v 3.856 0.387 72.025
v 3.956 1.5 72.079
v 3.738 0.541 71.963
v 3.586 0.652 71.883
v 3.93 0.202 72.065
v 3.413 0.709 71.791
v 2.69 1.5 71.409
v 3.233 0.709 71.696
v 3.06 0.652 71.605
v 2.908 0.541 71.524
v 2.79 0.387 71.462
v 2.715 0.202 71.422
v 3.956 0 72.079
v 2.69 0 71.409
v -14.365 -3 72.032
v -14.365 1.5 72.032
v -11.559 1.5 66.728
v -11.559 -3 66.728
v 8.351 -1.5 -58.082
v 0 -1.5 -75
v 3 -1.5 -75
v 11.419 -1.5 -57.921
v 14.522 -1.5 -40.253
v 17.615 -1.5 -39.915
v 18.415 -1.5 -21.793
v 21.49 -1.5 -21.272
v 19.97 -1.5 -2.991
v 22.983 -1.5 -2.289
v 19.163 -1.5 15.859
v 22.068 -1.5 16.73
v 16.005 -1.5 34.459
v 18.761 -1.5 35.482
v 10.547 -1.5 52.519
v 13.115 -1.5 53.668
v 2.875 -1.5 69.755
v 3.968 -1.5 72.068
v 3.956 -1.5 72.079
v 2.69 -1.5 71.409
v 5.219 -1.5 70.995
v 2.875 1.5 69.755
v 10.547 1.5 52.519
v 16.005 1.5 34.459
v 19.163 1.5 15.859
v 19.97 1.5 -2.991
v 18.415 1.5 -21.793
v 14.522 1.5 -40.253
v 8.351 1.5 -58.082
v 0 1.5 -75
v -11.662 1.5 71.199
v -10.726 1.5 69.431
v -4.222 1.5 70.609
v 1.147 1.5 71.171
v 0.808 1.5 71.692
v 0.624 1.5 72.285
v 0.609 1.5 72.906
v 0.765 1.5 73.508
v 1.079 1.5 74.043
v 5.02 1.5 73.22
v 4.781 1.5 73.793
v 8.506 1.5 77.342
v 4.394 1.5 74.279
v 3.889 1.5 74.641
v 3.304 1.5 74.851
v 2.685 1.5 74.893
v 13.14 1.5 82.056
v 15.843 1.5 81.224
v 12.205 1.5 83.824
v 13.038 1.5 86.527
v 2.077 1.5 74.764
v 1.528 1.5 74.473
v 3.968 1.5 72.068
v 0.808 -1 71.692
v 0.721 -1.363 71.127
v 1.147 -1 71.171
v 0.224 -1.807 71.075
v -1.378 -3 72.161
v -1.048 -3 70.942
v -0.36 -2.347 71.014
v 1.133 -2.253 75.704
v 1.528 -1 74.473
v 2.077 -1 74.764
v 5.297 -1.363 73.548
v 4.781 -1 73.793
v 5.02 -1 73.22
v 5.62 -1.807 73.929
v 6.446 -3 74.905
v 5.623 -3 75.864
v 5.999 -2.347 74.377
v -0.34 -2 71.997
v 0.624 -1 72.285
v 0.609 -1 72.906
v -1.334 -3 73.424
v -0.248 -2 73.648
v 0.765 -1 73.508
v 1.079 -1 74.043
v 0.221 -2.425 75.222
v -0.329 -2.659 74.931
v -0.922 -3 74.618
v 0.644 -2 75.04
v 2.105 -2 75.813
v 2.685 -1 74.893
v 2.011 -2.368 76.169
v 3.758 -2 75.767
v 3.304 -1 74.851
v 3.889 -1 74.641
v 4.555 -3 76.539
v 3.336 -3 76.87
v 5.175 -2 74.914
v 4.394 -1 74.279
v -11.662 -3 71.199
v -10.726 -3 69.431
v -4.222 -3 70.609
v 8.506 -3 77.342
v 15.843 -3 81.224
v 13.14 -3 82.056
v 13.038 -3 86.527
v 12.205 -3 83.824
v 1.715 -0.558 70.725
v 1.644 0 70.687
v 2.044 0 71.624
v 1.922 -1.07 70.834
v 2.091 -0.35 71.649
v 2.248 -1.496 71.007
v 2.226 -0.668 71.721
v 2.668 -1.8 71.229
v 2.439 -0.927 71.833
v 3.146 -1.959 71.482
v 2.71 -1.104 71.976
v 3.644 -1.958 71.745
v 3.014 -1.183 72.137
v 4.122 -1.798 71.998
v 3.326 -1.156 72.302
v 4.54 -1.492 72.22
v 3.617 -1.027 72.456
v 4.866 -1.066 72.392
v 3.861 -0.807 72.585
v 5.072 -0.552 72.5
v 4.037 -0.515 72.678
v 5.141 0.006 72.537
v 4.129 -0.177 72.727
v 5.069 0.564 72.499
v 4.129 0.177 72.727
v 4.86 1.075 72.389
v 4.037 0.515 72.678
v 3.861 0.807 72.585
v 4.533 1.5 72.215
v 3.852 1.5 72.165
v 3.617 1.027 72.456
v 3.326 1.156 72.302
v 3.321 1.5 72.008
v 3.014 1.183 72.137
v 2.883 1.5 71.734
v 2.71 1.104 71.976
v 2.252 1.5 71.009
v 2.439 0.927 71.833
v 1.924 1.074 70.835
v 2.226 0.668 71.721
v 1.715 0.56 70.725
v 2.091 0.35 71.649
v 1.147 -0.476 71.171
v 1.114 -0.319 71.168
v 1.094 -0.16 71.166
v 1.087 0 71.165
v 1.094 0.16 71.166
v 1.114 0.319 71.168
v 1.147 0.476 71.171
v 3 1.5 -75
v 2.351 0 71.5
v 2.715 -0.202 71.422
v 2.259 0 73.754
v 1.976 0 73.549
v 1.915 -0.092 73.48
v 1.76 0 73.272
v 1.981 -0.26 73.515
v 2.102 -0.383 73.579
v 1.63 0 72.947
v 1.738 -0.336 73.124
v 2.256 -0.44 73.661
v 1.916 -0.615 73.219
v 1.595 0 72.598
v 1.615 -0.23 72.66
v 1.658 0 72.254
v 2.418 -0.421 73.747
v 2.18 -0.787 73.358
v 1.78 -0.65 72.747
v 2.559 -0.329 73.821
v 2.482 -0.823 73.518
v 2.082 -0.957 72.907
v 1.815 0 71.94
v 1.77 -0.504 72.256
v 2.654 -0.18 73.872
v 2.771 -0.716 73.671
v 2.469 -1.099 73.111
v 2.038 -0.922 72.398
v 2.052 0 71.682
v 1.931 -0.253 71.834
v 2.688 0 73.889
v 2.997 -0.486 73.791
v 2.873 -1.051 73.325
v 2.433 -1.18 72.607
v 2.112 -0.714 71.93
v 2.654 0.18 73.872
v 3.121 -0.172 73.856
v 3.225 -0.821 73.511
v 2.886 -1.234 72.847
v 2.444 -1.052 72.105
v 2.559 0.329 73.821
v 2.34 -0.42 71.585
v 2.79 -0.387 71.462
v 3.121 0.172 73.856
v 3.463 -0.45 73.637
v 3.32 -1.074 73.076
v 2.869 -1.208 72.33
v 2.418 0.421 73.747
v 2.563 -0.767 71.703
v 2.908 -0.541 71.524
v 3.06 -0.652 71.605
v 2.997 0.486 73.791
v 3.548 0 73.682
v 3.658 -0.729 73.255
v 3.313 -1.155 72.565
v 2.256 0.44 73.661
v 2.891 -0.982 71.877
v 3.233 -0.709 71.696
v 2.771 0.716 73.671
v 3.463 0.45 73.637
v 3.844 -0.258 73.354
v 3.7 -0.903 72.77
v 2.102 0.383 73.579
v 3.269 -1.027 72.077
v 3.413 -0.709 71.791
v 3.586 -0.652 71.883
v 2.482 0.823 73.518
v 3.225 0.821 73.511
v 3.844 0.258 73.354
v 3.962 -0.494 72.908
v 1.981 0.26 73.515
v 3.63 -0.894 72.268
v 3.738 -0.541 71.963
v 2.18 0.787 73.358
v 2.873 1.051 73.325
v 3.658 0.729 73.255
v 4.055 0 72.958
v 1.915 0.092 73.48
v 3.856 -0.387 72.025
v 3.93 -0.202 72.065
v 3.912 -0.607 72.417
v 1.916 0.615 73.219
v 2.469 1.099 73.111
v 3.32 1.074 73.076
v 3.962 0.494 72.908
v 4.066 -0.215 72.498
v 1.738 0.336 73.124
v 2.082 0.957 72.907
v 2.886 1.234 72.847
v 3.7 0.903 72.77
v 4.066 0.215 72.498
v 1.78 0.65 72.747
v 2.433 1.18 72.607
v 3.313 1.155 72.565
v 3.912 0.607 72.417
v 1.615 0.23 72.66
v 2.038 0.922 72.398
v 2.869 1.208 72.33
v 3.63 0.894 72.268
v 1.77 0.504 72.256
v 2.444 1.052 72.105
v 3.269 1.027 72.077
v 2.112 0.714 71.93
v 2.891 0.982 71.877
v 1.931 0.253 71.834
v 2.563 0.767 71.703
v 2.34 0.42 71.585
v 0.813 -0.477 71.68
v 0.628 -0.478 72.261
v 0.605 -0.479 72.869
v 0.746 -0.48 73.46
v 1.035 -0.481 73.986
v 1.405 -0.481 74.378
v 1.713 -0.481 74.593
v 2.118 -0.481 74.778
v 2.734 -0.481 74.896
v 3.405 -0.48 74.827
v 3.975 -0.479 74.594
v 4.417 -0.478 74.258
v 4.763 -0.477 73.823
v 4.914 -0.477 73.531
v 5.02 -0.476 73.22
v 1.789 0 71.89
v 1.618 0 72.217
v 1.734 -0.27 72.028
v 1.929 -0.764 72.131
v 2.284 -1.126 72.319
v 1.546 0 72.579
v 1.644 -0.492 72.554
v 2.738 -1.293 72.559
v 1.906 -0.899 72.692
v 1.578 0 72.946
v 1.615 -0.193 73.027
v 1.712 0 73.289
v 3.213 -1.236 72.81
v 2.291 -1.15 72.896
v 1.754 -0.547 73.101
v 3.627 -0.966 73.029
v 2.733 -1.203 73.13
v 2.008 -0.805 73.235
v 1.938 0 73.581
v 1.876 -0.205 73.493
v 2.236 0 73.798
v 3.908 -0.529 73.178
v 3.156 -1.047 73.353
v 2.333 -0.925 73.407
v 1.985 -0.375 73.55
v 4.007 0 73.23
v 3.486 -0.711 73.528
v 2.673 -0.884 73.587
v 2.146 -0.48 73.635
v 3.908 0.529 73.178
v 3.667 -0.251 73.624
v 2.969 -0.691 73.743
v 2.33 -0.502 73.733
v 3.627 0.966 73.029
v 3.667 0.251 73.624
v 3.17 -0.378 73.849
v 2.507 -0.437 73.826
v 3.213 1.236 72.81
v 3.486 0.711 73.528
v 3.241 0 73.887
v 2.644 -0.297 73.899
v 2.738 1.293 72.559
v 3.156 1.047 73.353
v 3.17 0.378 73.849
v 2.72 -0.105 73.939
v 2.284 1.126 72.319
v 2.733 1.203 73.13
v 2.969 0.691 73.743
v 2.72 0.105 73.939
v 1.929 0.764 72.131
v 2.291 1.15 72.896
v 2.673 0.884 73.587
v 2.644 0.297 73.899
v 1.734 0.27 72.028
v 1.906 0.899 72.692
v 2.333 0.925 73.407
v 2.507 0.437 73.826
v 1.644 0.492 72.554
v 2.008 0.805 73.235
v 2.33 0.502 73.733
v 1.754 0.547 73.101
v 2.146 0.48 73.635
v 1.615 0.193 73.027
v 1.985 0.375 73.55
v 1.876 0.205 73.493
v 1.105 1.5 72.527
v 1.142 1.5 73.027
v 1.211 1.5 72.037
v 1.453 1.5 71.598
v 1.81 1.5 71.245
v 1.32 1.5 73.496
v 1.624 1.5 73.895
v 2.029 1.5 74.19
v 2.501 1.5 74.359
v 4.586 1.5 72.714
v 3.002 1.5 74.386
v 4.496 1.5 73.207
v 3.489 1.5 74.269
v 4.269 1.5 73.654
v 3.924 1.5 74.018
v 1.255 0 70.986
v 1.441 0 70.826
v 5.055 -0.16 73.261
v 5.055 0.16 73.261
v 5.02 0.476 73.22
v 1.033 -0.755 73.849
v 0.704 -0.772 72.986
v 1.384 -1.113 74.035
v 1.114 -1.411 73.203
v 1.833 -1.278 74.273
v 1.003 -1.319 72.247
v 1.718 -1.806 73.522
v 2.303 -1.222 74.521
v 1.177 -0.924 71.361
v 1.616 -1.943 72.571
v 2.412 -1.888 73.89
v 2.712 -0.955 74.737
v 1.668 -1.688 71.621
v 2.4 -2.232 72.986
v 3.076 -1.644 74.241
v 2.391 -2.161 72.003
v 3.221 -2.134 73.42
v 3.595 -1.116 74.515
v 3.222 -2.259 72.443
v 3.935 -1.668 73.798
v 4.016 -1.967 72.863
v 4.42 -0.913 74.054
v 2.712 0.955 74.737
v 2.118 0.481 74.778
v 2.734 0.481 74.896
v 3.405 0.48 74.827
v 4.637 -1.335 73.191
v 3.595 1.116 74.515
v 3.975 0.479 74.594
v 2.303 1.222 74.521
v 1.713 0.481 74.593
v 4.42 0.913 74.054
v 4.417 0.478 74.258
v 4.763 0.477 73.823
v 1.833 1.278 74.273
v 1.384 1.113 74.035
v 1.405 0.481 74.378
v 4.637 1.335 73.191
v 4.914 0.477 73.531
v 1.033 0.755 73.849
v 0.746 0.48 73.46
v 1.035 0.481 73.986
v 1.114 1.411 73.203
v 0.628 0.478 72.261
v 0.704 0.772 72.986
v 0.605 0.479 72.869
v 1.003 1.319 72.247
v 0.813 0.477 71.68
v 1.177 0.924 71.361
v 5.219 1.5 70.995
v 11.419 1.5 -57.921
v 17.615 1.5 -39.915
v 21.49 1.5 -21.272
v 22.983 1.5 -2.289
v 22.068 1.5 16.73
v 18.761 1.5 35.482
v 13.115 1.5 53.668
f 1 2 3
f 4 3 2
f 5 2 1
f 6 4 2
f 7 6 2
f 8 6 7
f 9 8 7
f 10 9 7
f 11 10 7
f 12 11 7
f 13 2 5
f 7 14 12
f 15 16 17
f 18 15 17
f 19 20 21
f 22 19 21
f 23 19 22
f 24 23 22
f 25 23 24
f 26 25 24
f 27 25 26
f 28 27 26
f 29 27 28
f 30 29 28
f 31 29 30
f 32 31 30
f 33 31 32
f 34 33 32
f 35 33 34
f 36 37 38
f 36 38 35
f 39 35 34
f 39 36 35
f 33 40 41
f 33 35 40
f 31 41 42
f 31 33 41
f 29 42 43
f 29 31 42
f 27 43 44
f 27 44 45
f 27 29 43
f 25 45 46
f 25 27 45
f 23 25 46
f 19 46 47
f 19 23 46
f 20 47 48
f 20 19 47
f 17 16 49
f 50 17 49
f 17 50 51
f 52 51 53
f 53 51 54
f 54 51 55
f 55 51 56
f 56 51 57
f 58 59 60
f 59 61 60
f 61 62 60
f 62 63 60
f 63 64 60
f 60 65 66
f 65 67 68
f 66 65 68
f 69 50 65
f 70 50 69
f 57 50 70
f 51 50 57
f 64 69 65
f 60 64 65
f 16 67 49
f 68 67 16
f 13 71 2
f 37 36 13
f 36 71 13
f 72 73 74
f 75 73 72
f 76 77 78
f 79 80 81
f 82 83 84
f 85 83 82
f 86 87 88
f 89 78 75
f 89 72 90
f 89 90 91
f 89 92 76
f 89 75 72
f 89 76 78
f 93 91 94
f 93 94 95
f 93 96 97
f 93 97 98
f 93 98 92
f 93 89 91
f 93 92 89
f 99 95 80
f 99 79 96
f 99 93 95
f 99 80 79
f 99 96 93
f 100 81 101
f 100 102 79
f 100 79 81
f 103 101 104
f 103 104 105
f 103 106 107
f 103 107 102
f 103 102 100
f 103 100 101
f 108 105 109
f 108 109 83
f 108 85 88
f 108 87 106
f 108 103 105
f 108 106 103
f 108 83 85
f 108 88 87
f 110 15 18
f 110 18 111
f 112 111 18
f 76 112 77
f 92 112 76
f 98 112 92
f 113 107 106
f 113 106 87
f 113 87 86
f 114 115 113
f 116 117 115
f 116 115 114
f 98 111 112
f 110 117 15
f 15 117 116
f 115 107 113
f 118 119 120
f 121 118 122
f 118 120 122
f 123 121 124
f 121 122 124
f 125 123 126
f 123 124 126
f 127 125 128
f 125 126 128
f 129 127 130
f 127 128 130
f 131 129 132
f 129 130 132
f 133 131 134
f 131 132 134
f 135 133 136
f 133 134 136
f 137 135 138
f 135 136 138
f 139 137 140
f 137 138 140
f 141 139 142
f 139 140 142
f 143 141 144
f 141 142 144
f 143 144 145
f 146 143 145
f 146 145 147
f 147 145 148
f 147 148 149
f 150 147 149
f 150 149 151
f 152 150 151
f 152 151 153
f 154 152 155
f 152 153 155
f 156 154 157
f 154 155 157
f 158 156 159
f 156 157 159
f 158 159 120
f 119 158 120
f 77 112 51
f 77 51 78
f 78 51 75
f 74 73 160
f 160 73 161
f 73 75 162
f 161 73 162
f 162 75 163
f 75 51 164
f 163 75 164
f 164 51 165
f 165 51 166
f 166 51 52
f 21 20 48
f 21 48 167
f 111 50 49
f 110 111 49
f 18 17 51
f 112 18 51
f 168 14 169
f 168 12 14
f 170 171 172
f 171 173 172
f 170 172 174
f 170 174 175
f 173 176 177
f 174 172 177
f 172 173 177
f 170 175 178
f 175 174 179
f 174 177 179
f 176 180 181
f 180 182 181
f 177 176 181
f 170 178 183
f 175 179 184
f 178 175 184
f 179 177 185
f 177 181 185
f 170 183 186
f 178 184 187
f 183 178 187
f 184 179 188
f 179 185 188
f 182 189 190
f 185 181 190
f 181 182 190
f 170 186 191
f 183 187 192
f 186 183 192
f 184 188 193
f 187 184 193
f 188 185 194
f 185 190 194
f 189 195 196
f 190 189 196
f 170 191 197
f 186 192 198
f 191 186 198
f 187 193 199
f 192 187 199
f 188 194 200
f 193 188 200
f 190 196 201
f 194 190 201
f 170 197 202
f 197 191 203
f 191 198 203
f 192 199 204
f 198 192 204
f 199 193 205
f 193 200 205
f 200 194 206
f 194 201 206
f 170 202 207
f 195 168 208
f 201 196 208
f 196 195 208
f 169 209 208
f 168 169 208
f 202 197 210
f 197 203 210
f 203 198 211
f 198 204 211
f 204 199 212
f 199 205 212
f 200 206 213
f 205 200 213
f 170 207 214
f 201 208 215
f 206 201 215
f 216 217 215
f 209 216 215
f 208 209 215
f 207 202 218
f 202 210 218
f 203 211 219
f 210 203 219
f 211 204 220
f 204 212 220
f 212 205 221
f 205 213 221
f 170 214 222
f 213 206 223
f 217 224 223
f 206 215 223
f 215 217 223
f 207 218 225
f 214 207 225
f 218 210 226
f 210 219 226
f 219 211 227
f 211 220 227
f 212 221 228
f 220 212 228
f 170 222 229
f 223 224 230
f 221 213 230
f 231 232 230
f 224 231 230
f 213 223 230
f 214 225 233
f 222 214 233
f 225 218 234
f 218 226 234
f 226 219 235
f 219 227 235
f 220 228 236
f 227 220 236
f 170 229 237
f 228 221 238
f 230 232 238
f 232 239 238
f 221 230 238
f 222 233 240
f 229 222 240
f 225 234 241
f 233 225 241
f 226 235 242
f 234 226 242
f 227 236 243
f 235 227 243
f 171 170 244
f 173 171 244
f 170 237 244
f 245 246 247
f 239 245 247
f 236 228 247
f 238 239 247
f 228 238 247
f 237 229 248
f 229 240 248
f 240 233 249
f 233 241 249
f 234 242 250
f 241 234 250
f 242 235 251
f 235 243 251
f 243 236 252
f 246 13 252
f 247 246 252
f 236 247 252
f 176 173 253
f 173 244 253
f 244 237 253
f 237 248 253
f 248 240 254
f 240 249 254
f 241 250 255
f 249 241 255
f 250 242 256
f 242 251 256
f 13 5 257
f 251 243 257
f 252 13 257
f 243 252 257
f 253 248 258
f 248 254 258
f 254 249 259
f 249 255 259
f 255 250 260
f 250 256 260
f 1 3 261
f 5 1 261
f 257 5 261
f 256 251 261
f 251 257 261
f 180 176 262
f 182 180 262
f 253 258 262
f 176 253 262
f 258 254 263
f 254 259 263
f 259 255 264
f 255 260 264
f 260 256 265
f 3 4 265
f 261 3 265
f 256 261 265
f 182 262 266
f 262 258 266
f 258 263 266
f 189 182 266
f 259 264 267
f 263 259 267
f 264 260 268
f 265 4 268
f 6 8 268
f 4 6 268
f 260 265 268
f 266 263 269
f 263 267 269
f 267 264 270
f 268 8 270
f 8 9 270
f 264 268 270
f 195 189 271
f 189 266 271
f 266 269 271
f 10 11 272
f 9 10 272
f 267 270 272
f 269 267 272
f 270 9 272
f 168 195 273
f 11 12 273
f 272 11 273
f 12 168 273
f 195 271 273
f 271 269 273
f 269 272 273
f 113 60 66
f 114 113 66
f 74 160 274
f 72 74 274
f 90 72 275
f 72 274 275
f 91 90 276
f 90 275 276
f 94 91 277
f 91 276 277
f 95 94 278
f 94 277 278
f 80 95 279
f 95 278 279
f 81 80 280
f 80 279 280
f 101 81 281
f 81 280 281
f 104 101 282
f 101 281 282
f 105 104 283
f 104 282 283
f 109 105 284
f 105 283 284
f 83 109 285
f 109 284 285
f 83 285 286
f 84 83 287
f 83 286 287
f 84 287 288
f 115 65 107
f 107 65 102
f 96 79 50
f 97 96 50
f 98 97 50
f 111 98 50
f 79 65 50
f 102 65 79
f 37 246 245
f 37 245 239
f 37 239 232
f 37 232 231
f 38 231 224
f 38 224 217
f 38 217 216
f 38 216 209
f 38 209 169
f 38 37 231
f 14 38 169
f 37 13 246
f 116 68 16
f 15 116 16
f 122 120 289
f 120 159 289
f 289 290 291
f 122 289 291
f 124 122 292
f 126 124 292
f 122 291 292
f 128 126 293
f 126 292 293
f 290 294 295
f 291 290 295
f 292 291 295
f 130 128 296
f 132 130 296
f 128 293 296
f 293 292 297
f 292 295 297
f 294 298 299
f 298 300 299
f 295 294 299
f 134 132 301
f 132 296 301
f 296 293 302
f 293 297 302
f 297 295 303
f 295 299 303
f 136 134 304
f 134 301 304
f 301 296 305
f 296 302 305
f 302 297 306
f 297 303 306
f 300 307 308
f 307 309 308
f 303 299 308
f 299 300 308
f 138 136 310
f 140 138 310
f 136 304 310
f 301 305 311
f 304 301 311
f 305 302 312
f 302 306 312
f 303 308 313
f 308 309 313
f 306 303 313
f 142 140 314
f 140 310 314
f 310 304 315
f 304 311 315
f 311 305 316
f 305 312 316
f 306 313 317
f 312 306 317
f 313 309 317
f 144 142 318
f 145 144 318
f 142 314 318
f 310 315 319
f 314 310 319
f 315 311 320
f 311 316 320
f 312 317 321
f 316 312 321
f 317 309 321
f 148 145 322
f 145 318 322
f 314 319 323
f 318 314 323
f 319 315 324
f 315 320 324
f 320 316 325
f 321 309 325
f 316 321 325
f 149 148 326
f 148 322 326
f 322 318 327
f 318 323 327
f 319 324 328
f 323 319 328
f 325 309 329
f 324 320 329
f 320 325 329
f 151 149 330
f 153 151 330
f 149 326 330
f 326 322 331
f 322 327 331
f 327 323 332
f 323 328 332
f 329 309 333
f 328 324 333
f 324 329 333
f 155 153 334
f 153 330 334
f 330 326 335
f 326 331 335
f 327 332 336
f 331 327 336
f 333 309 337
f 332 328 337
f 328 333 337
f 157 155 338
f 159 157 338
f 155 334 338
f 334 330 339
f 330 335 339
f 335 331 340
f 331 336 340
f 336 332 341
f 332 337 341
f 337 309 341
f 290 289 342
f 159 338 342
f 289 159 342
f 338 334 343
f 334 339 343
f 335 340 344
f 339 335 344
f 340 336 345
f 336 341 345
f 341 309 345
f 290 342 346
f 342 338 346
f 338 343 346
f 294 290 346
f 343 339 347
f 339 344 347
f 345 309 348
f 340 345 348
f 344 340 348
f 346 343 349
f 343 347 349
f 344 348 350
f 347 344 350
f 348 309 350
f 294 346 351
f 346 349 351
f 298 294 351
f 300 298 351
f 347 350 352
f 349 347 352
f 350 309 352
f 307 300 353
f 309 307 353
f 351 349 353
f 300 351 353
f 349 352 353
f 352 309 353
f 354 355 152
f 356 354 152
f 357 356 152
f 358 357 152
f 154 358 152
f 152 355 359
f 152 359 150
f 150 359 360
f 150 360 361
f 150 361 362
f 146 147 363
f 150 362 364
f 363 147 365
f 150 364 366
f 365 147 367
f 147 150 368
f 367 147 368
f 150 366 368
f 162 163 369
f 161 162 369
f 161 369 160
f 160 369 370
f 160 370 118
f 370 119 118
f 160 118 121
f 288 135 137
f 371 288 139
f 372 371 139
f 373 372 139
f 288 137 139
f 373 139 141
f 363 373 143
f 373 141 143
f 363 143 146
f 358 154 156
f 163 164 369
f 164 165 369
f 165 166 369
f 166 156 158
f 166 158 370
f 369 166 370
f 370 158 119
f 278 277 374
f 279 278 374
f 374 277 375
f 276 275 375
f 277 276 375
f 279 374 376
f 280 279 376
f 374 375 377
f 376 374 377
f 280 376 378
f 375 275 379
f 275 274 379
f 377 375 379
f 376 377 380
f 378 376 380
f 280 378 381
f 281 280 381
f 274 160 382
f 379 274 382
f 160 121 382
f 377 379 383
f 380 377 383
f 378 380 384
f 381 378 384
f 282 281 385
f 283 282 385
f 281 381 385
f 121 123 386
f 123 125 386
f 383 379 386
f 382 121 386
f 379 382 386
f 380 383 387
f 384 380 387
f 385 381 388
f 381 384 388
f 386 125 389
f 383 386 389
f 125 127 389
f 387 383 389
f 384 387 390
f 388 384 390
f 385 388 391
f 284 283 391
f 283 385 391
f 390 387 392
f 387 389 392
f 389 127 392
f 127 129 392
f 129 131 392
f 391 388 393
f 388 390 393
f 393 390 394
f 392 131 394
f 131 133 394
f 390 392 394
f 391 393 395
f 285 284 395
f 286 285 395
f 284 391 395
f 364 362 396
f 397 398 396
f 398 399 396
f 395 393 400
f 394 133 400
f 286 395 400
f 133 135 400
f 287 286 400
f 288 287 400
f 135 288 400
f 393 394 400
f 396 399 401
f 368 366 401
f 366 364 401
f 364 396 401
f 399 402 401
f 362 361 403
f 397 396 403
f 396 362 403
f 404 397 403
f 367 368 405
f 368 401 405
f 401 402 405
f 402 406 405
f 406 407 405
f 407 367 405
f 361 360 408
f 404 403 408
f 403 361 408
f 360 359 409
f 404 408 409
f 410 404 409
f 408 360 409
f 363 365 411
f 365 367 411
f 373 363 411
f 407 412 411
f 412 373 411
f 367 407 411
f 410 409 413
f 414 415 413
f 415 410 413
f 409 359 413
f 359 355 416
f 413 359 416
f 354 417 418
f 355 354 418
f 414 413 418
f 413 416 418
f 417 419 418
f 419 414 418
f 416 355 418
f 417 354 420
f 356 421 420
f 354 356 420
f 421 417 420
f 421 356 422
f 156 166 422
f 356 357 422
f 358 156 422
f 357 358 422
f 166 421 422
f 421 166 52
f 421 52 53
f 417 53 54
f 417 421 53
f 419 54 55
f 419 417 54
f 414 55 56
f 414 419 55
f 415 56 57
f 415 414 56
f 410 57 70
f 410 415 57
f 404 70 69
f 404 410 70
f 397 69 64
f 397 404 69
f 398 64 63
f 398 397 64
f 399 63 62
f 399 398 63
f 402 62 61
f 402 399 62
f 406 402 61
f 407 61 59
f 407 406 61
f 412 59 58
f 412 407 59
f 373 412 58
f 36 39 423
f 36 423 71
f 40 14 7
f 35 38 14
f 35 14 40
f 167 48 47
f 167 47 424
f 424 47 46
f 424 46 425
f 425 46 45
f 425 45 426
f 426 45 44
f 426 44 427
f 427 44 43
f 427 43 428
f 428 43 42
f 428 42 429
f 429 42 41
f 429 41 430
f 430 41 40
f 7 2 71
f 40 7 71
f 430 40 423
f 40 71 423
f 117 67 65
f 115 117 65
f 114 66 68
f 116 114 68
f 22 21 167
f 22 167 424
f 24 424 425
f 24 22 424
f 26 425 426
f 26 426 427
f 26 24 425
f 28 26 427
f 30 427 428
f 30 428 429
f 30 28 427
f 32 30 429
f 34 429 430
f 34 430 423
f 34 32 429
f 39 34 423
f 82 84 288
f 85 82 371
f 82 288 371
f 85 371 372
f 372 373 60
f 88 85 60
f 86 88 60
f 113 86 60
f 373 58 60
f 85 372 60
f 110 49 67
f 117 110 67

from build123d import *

# Parameters (mm, degrees)
F1_DEPTH      = 1.5
F6_DEPTH      = 2
F6_DEPTH_BACK = 3
F8_W          = 33.8980406523
F8_H          = 26.2241512537
F9_DEPTH      = 4
F10_T2_ANGLE  = 359.64


# Not quite as in the source:
# - a fillet or chamfer that OpenCascade refuses, or shapes differently, is made with other operations: its cross-section is extruded or revolved along the edge and cut away or added


with BuildPart() as f1:
    # F0 (on Front) → F1 (new body, symmetric)
    with BuildSketch(Plane.XZ):
        with BuildLine():
            ThreePointArc((2.874675002, 69.7547661407), (19.9703072521, -2.9906619086), (0, -75))
            Line((0, -75), (3, -75))
            ThreePointArc((3, -75), (22.9826005439, -2.2893849442), (5.2192689269, 70.9950057277))
            Line((5.2192689269, 70.9950057277), (3.9680614468, 72.0683399281))
            Line((3.9680614468, 72.0683399281), (3.9560562747, 72.0786384293))
            Line((3.9560562747, 72.0786384293), (2.6897316802, 71.4087800477))
            Line((2.6897316802, 71.4087800477), (2.874675002, 69.7547661407))
        make_face()
    extrude(amount=F1_DEPTH, both=True)

    # F2 (on Front) → F11 (revolve)
    with BuildSketch(Plane.XZ):
        with BuildLine():
            Line((3.4283745063, 71.5443050188), (2.259403264, 73.7541706787))
            ThreePointArc((2.259403264, 73.7541706787), (1.7389560552, 72.0647522276), (3.4283745063, 71.5443050188))
        make_face()
    revolve(axis=Axis((2.3768325607, 0, 73.5321780745), (-0.4675884969, 0, 0.8839462639)))


with BuildPart() as f4:
    # F3 (on Front) → F4 (revolve)
    with BuildSketch(Plane.XZ):
        with BuildLine():
            ThreePointArc((2.0443154021, 71.6242099246), (1.5489133531, 72.763423537), (2.2360238391, 73.7983679919))
            Line((2.2360238391, 73.7983679919), (1.7684353422, 74.6823142558))
            ThreePointArc((1.7684353422, 74.6823142558), (0.5450086387, 72.7209986501), (1.6437255478, 70.6871960643))
            Line((1.6437255478, 70.6871960643), (2.0443154021, 71.6242099246))
        make_face()
    revolve(axis=Axis((2.532587825, 0, 73.2377326703), (-0.4675884969, 0, 0.8839462639)))

    # F5 (on Front) → F6 (join, two sides)
    with BuildSketch(Plane.XZ) as f6_sk:
        with BuildLine():
            Line((-14.3645751176, 72.0319375121), (-11.559044136, 66.7282599284))
            Line((-11.559044136, 66.7282599284), (-4.2218675739, 70.6094679841))
            Line((-4.2218675739, 70.6094679841), (1.1471386437, 71.1712600625))
            ThreePointArc((1.1471386437, 71.1712600625), (1.7922159684, 74.637358497), (5.0204523013, 73.2201593963))
            Line((5.0204523013, 73.2201593963), (8.506113484, 77.3422952775))
            Line((8.506113484, 77.3422952775), (15.8432900462, 81.2235033332))
            Line((15.8432900462, 81.2235033332), (13.0377590646, 86.5271809169))
            Line((13.0377590646, 86.5271809169), (-14.3645751176, 72.0319375121))
        make_face()
        Polygon((-10.726328602, 69.4313294501), (-11.6615055959, 71.199221978), (12.2050435306, 83.8241113951), (13.1402205245, 82.0562188673), align=None, mode=Mode.SUBTRACT)
    extrude(amount=-F6_DEPTH)
    extrude(f6_sk.sketch, amount=F6_DEPTH_BACK)

    # F8 (on offset) → F9 (cut)
    with BuildSketch(Plane.XZ.offset(-1.5)):
        with Locations((0.1696329564, 77.5720775127)):
            Rectangle(F8_W, F8_H)
    extrude(amount=-F9_DEPTH, mode=Mode.SUBTRACT)

    # F10: chamfer of 2 on 1 edges, made by hand

    # F10_s1 → F10_t2 (revolve, cut)
    with BuildSketch(Plane(origin=(32.1280601549, 0, 16.8660881044), x_dir=(0, 1, 0), z_dir=(0.885410872, 0, 0.464809195))):
        Polygon((-1, 60.7517013138), (-3, 58.7517013138), (-3, 60.7517013138), align=None)
    revolve(axis=Axis((2.8442900865, -3, 72.6484794032), (0, 1, 0)), revolution_arc=F10_T2_ANGLE, mode=Mode.SUBTRACT)


solid = Compound([f1.part, f4.part])
